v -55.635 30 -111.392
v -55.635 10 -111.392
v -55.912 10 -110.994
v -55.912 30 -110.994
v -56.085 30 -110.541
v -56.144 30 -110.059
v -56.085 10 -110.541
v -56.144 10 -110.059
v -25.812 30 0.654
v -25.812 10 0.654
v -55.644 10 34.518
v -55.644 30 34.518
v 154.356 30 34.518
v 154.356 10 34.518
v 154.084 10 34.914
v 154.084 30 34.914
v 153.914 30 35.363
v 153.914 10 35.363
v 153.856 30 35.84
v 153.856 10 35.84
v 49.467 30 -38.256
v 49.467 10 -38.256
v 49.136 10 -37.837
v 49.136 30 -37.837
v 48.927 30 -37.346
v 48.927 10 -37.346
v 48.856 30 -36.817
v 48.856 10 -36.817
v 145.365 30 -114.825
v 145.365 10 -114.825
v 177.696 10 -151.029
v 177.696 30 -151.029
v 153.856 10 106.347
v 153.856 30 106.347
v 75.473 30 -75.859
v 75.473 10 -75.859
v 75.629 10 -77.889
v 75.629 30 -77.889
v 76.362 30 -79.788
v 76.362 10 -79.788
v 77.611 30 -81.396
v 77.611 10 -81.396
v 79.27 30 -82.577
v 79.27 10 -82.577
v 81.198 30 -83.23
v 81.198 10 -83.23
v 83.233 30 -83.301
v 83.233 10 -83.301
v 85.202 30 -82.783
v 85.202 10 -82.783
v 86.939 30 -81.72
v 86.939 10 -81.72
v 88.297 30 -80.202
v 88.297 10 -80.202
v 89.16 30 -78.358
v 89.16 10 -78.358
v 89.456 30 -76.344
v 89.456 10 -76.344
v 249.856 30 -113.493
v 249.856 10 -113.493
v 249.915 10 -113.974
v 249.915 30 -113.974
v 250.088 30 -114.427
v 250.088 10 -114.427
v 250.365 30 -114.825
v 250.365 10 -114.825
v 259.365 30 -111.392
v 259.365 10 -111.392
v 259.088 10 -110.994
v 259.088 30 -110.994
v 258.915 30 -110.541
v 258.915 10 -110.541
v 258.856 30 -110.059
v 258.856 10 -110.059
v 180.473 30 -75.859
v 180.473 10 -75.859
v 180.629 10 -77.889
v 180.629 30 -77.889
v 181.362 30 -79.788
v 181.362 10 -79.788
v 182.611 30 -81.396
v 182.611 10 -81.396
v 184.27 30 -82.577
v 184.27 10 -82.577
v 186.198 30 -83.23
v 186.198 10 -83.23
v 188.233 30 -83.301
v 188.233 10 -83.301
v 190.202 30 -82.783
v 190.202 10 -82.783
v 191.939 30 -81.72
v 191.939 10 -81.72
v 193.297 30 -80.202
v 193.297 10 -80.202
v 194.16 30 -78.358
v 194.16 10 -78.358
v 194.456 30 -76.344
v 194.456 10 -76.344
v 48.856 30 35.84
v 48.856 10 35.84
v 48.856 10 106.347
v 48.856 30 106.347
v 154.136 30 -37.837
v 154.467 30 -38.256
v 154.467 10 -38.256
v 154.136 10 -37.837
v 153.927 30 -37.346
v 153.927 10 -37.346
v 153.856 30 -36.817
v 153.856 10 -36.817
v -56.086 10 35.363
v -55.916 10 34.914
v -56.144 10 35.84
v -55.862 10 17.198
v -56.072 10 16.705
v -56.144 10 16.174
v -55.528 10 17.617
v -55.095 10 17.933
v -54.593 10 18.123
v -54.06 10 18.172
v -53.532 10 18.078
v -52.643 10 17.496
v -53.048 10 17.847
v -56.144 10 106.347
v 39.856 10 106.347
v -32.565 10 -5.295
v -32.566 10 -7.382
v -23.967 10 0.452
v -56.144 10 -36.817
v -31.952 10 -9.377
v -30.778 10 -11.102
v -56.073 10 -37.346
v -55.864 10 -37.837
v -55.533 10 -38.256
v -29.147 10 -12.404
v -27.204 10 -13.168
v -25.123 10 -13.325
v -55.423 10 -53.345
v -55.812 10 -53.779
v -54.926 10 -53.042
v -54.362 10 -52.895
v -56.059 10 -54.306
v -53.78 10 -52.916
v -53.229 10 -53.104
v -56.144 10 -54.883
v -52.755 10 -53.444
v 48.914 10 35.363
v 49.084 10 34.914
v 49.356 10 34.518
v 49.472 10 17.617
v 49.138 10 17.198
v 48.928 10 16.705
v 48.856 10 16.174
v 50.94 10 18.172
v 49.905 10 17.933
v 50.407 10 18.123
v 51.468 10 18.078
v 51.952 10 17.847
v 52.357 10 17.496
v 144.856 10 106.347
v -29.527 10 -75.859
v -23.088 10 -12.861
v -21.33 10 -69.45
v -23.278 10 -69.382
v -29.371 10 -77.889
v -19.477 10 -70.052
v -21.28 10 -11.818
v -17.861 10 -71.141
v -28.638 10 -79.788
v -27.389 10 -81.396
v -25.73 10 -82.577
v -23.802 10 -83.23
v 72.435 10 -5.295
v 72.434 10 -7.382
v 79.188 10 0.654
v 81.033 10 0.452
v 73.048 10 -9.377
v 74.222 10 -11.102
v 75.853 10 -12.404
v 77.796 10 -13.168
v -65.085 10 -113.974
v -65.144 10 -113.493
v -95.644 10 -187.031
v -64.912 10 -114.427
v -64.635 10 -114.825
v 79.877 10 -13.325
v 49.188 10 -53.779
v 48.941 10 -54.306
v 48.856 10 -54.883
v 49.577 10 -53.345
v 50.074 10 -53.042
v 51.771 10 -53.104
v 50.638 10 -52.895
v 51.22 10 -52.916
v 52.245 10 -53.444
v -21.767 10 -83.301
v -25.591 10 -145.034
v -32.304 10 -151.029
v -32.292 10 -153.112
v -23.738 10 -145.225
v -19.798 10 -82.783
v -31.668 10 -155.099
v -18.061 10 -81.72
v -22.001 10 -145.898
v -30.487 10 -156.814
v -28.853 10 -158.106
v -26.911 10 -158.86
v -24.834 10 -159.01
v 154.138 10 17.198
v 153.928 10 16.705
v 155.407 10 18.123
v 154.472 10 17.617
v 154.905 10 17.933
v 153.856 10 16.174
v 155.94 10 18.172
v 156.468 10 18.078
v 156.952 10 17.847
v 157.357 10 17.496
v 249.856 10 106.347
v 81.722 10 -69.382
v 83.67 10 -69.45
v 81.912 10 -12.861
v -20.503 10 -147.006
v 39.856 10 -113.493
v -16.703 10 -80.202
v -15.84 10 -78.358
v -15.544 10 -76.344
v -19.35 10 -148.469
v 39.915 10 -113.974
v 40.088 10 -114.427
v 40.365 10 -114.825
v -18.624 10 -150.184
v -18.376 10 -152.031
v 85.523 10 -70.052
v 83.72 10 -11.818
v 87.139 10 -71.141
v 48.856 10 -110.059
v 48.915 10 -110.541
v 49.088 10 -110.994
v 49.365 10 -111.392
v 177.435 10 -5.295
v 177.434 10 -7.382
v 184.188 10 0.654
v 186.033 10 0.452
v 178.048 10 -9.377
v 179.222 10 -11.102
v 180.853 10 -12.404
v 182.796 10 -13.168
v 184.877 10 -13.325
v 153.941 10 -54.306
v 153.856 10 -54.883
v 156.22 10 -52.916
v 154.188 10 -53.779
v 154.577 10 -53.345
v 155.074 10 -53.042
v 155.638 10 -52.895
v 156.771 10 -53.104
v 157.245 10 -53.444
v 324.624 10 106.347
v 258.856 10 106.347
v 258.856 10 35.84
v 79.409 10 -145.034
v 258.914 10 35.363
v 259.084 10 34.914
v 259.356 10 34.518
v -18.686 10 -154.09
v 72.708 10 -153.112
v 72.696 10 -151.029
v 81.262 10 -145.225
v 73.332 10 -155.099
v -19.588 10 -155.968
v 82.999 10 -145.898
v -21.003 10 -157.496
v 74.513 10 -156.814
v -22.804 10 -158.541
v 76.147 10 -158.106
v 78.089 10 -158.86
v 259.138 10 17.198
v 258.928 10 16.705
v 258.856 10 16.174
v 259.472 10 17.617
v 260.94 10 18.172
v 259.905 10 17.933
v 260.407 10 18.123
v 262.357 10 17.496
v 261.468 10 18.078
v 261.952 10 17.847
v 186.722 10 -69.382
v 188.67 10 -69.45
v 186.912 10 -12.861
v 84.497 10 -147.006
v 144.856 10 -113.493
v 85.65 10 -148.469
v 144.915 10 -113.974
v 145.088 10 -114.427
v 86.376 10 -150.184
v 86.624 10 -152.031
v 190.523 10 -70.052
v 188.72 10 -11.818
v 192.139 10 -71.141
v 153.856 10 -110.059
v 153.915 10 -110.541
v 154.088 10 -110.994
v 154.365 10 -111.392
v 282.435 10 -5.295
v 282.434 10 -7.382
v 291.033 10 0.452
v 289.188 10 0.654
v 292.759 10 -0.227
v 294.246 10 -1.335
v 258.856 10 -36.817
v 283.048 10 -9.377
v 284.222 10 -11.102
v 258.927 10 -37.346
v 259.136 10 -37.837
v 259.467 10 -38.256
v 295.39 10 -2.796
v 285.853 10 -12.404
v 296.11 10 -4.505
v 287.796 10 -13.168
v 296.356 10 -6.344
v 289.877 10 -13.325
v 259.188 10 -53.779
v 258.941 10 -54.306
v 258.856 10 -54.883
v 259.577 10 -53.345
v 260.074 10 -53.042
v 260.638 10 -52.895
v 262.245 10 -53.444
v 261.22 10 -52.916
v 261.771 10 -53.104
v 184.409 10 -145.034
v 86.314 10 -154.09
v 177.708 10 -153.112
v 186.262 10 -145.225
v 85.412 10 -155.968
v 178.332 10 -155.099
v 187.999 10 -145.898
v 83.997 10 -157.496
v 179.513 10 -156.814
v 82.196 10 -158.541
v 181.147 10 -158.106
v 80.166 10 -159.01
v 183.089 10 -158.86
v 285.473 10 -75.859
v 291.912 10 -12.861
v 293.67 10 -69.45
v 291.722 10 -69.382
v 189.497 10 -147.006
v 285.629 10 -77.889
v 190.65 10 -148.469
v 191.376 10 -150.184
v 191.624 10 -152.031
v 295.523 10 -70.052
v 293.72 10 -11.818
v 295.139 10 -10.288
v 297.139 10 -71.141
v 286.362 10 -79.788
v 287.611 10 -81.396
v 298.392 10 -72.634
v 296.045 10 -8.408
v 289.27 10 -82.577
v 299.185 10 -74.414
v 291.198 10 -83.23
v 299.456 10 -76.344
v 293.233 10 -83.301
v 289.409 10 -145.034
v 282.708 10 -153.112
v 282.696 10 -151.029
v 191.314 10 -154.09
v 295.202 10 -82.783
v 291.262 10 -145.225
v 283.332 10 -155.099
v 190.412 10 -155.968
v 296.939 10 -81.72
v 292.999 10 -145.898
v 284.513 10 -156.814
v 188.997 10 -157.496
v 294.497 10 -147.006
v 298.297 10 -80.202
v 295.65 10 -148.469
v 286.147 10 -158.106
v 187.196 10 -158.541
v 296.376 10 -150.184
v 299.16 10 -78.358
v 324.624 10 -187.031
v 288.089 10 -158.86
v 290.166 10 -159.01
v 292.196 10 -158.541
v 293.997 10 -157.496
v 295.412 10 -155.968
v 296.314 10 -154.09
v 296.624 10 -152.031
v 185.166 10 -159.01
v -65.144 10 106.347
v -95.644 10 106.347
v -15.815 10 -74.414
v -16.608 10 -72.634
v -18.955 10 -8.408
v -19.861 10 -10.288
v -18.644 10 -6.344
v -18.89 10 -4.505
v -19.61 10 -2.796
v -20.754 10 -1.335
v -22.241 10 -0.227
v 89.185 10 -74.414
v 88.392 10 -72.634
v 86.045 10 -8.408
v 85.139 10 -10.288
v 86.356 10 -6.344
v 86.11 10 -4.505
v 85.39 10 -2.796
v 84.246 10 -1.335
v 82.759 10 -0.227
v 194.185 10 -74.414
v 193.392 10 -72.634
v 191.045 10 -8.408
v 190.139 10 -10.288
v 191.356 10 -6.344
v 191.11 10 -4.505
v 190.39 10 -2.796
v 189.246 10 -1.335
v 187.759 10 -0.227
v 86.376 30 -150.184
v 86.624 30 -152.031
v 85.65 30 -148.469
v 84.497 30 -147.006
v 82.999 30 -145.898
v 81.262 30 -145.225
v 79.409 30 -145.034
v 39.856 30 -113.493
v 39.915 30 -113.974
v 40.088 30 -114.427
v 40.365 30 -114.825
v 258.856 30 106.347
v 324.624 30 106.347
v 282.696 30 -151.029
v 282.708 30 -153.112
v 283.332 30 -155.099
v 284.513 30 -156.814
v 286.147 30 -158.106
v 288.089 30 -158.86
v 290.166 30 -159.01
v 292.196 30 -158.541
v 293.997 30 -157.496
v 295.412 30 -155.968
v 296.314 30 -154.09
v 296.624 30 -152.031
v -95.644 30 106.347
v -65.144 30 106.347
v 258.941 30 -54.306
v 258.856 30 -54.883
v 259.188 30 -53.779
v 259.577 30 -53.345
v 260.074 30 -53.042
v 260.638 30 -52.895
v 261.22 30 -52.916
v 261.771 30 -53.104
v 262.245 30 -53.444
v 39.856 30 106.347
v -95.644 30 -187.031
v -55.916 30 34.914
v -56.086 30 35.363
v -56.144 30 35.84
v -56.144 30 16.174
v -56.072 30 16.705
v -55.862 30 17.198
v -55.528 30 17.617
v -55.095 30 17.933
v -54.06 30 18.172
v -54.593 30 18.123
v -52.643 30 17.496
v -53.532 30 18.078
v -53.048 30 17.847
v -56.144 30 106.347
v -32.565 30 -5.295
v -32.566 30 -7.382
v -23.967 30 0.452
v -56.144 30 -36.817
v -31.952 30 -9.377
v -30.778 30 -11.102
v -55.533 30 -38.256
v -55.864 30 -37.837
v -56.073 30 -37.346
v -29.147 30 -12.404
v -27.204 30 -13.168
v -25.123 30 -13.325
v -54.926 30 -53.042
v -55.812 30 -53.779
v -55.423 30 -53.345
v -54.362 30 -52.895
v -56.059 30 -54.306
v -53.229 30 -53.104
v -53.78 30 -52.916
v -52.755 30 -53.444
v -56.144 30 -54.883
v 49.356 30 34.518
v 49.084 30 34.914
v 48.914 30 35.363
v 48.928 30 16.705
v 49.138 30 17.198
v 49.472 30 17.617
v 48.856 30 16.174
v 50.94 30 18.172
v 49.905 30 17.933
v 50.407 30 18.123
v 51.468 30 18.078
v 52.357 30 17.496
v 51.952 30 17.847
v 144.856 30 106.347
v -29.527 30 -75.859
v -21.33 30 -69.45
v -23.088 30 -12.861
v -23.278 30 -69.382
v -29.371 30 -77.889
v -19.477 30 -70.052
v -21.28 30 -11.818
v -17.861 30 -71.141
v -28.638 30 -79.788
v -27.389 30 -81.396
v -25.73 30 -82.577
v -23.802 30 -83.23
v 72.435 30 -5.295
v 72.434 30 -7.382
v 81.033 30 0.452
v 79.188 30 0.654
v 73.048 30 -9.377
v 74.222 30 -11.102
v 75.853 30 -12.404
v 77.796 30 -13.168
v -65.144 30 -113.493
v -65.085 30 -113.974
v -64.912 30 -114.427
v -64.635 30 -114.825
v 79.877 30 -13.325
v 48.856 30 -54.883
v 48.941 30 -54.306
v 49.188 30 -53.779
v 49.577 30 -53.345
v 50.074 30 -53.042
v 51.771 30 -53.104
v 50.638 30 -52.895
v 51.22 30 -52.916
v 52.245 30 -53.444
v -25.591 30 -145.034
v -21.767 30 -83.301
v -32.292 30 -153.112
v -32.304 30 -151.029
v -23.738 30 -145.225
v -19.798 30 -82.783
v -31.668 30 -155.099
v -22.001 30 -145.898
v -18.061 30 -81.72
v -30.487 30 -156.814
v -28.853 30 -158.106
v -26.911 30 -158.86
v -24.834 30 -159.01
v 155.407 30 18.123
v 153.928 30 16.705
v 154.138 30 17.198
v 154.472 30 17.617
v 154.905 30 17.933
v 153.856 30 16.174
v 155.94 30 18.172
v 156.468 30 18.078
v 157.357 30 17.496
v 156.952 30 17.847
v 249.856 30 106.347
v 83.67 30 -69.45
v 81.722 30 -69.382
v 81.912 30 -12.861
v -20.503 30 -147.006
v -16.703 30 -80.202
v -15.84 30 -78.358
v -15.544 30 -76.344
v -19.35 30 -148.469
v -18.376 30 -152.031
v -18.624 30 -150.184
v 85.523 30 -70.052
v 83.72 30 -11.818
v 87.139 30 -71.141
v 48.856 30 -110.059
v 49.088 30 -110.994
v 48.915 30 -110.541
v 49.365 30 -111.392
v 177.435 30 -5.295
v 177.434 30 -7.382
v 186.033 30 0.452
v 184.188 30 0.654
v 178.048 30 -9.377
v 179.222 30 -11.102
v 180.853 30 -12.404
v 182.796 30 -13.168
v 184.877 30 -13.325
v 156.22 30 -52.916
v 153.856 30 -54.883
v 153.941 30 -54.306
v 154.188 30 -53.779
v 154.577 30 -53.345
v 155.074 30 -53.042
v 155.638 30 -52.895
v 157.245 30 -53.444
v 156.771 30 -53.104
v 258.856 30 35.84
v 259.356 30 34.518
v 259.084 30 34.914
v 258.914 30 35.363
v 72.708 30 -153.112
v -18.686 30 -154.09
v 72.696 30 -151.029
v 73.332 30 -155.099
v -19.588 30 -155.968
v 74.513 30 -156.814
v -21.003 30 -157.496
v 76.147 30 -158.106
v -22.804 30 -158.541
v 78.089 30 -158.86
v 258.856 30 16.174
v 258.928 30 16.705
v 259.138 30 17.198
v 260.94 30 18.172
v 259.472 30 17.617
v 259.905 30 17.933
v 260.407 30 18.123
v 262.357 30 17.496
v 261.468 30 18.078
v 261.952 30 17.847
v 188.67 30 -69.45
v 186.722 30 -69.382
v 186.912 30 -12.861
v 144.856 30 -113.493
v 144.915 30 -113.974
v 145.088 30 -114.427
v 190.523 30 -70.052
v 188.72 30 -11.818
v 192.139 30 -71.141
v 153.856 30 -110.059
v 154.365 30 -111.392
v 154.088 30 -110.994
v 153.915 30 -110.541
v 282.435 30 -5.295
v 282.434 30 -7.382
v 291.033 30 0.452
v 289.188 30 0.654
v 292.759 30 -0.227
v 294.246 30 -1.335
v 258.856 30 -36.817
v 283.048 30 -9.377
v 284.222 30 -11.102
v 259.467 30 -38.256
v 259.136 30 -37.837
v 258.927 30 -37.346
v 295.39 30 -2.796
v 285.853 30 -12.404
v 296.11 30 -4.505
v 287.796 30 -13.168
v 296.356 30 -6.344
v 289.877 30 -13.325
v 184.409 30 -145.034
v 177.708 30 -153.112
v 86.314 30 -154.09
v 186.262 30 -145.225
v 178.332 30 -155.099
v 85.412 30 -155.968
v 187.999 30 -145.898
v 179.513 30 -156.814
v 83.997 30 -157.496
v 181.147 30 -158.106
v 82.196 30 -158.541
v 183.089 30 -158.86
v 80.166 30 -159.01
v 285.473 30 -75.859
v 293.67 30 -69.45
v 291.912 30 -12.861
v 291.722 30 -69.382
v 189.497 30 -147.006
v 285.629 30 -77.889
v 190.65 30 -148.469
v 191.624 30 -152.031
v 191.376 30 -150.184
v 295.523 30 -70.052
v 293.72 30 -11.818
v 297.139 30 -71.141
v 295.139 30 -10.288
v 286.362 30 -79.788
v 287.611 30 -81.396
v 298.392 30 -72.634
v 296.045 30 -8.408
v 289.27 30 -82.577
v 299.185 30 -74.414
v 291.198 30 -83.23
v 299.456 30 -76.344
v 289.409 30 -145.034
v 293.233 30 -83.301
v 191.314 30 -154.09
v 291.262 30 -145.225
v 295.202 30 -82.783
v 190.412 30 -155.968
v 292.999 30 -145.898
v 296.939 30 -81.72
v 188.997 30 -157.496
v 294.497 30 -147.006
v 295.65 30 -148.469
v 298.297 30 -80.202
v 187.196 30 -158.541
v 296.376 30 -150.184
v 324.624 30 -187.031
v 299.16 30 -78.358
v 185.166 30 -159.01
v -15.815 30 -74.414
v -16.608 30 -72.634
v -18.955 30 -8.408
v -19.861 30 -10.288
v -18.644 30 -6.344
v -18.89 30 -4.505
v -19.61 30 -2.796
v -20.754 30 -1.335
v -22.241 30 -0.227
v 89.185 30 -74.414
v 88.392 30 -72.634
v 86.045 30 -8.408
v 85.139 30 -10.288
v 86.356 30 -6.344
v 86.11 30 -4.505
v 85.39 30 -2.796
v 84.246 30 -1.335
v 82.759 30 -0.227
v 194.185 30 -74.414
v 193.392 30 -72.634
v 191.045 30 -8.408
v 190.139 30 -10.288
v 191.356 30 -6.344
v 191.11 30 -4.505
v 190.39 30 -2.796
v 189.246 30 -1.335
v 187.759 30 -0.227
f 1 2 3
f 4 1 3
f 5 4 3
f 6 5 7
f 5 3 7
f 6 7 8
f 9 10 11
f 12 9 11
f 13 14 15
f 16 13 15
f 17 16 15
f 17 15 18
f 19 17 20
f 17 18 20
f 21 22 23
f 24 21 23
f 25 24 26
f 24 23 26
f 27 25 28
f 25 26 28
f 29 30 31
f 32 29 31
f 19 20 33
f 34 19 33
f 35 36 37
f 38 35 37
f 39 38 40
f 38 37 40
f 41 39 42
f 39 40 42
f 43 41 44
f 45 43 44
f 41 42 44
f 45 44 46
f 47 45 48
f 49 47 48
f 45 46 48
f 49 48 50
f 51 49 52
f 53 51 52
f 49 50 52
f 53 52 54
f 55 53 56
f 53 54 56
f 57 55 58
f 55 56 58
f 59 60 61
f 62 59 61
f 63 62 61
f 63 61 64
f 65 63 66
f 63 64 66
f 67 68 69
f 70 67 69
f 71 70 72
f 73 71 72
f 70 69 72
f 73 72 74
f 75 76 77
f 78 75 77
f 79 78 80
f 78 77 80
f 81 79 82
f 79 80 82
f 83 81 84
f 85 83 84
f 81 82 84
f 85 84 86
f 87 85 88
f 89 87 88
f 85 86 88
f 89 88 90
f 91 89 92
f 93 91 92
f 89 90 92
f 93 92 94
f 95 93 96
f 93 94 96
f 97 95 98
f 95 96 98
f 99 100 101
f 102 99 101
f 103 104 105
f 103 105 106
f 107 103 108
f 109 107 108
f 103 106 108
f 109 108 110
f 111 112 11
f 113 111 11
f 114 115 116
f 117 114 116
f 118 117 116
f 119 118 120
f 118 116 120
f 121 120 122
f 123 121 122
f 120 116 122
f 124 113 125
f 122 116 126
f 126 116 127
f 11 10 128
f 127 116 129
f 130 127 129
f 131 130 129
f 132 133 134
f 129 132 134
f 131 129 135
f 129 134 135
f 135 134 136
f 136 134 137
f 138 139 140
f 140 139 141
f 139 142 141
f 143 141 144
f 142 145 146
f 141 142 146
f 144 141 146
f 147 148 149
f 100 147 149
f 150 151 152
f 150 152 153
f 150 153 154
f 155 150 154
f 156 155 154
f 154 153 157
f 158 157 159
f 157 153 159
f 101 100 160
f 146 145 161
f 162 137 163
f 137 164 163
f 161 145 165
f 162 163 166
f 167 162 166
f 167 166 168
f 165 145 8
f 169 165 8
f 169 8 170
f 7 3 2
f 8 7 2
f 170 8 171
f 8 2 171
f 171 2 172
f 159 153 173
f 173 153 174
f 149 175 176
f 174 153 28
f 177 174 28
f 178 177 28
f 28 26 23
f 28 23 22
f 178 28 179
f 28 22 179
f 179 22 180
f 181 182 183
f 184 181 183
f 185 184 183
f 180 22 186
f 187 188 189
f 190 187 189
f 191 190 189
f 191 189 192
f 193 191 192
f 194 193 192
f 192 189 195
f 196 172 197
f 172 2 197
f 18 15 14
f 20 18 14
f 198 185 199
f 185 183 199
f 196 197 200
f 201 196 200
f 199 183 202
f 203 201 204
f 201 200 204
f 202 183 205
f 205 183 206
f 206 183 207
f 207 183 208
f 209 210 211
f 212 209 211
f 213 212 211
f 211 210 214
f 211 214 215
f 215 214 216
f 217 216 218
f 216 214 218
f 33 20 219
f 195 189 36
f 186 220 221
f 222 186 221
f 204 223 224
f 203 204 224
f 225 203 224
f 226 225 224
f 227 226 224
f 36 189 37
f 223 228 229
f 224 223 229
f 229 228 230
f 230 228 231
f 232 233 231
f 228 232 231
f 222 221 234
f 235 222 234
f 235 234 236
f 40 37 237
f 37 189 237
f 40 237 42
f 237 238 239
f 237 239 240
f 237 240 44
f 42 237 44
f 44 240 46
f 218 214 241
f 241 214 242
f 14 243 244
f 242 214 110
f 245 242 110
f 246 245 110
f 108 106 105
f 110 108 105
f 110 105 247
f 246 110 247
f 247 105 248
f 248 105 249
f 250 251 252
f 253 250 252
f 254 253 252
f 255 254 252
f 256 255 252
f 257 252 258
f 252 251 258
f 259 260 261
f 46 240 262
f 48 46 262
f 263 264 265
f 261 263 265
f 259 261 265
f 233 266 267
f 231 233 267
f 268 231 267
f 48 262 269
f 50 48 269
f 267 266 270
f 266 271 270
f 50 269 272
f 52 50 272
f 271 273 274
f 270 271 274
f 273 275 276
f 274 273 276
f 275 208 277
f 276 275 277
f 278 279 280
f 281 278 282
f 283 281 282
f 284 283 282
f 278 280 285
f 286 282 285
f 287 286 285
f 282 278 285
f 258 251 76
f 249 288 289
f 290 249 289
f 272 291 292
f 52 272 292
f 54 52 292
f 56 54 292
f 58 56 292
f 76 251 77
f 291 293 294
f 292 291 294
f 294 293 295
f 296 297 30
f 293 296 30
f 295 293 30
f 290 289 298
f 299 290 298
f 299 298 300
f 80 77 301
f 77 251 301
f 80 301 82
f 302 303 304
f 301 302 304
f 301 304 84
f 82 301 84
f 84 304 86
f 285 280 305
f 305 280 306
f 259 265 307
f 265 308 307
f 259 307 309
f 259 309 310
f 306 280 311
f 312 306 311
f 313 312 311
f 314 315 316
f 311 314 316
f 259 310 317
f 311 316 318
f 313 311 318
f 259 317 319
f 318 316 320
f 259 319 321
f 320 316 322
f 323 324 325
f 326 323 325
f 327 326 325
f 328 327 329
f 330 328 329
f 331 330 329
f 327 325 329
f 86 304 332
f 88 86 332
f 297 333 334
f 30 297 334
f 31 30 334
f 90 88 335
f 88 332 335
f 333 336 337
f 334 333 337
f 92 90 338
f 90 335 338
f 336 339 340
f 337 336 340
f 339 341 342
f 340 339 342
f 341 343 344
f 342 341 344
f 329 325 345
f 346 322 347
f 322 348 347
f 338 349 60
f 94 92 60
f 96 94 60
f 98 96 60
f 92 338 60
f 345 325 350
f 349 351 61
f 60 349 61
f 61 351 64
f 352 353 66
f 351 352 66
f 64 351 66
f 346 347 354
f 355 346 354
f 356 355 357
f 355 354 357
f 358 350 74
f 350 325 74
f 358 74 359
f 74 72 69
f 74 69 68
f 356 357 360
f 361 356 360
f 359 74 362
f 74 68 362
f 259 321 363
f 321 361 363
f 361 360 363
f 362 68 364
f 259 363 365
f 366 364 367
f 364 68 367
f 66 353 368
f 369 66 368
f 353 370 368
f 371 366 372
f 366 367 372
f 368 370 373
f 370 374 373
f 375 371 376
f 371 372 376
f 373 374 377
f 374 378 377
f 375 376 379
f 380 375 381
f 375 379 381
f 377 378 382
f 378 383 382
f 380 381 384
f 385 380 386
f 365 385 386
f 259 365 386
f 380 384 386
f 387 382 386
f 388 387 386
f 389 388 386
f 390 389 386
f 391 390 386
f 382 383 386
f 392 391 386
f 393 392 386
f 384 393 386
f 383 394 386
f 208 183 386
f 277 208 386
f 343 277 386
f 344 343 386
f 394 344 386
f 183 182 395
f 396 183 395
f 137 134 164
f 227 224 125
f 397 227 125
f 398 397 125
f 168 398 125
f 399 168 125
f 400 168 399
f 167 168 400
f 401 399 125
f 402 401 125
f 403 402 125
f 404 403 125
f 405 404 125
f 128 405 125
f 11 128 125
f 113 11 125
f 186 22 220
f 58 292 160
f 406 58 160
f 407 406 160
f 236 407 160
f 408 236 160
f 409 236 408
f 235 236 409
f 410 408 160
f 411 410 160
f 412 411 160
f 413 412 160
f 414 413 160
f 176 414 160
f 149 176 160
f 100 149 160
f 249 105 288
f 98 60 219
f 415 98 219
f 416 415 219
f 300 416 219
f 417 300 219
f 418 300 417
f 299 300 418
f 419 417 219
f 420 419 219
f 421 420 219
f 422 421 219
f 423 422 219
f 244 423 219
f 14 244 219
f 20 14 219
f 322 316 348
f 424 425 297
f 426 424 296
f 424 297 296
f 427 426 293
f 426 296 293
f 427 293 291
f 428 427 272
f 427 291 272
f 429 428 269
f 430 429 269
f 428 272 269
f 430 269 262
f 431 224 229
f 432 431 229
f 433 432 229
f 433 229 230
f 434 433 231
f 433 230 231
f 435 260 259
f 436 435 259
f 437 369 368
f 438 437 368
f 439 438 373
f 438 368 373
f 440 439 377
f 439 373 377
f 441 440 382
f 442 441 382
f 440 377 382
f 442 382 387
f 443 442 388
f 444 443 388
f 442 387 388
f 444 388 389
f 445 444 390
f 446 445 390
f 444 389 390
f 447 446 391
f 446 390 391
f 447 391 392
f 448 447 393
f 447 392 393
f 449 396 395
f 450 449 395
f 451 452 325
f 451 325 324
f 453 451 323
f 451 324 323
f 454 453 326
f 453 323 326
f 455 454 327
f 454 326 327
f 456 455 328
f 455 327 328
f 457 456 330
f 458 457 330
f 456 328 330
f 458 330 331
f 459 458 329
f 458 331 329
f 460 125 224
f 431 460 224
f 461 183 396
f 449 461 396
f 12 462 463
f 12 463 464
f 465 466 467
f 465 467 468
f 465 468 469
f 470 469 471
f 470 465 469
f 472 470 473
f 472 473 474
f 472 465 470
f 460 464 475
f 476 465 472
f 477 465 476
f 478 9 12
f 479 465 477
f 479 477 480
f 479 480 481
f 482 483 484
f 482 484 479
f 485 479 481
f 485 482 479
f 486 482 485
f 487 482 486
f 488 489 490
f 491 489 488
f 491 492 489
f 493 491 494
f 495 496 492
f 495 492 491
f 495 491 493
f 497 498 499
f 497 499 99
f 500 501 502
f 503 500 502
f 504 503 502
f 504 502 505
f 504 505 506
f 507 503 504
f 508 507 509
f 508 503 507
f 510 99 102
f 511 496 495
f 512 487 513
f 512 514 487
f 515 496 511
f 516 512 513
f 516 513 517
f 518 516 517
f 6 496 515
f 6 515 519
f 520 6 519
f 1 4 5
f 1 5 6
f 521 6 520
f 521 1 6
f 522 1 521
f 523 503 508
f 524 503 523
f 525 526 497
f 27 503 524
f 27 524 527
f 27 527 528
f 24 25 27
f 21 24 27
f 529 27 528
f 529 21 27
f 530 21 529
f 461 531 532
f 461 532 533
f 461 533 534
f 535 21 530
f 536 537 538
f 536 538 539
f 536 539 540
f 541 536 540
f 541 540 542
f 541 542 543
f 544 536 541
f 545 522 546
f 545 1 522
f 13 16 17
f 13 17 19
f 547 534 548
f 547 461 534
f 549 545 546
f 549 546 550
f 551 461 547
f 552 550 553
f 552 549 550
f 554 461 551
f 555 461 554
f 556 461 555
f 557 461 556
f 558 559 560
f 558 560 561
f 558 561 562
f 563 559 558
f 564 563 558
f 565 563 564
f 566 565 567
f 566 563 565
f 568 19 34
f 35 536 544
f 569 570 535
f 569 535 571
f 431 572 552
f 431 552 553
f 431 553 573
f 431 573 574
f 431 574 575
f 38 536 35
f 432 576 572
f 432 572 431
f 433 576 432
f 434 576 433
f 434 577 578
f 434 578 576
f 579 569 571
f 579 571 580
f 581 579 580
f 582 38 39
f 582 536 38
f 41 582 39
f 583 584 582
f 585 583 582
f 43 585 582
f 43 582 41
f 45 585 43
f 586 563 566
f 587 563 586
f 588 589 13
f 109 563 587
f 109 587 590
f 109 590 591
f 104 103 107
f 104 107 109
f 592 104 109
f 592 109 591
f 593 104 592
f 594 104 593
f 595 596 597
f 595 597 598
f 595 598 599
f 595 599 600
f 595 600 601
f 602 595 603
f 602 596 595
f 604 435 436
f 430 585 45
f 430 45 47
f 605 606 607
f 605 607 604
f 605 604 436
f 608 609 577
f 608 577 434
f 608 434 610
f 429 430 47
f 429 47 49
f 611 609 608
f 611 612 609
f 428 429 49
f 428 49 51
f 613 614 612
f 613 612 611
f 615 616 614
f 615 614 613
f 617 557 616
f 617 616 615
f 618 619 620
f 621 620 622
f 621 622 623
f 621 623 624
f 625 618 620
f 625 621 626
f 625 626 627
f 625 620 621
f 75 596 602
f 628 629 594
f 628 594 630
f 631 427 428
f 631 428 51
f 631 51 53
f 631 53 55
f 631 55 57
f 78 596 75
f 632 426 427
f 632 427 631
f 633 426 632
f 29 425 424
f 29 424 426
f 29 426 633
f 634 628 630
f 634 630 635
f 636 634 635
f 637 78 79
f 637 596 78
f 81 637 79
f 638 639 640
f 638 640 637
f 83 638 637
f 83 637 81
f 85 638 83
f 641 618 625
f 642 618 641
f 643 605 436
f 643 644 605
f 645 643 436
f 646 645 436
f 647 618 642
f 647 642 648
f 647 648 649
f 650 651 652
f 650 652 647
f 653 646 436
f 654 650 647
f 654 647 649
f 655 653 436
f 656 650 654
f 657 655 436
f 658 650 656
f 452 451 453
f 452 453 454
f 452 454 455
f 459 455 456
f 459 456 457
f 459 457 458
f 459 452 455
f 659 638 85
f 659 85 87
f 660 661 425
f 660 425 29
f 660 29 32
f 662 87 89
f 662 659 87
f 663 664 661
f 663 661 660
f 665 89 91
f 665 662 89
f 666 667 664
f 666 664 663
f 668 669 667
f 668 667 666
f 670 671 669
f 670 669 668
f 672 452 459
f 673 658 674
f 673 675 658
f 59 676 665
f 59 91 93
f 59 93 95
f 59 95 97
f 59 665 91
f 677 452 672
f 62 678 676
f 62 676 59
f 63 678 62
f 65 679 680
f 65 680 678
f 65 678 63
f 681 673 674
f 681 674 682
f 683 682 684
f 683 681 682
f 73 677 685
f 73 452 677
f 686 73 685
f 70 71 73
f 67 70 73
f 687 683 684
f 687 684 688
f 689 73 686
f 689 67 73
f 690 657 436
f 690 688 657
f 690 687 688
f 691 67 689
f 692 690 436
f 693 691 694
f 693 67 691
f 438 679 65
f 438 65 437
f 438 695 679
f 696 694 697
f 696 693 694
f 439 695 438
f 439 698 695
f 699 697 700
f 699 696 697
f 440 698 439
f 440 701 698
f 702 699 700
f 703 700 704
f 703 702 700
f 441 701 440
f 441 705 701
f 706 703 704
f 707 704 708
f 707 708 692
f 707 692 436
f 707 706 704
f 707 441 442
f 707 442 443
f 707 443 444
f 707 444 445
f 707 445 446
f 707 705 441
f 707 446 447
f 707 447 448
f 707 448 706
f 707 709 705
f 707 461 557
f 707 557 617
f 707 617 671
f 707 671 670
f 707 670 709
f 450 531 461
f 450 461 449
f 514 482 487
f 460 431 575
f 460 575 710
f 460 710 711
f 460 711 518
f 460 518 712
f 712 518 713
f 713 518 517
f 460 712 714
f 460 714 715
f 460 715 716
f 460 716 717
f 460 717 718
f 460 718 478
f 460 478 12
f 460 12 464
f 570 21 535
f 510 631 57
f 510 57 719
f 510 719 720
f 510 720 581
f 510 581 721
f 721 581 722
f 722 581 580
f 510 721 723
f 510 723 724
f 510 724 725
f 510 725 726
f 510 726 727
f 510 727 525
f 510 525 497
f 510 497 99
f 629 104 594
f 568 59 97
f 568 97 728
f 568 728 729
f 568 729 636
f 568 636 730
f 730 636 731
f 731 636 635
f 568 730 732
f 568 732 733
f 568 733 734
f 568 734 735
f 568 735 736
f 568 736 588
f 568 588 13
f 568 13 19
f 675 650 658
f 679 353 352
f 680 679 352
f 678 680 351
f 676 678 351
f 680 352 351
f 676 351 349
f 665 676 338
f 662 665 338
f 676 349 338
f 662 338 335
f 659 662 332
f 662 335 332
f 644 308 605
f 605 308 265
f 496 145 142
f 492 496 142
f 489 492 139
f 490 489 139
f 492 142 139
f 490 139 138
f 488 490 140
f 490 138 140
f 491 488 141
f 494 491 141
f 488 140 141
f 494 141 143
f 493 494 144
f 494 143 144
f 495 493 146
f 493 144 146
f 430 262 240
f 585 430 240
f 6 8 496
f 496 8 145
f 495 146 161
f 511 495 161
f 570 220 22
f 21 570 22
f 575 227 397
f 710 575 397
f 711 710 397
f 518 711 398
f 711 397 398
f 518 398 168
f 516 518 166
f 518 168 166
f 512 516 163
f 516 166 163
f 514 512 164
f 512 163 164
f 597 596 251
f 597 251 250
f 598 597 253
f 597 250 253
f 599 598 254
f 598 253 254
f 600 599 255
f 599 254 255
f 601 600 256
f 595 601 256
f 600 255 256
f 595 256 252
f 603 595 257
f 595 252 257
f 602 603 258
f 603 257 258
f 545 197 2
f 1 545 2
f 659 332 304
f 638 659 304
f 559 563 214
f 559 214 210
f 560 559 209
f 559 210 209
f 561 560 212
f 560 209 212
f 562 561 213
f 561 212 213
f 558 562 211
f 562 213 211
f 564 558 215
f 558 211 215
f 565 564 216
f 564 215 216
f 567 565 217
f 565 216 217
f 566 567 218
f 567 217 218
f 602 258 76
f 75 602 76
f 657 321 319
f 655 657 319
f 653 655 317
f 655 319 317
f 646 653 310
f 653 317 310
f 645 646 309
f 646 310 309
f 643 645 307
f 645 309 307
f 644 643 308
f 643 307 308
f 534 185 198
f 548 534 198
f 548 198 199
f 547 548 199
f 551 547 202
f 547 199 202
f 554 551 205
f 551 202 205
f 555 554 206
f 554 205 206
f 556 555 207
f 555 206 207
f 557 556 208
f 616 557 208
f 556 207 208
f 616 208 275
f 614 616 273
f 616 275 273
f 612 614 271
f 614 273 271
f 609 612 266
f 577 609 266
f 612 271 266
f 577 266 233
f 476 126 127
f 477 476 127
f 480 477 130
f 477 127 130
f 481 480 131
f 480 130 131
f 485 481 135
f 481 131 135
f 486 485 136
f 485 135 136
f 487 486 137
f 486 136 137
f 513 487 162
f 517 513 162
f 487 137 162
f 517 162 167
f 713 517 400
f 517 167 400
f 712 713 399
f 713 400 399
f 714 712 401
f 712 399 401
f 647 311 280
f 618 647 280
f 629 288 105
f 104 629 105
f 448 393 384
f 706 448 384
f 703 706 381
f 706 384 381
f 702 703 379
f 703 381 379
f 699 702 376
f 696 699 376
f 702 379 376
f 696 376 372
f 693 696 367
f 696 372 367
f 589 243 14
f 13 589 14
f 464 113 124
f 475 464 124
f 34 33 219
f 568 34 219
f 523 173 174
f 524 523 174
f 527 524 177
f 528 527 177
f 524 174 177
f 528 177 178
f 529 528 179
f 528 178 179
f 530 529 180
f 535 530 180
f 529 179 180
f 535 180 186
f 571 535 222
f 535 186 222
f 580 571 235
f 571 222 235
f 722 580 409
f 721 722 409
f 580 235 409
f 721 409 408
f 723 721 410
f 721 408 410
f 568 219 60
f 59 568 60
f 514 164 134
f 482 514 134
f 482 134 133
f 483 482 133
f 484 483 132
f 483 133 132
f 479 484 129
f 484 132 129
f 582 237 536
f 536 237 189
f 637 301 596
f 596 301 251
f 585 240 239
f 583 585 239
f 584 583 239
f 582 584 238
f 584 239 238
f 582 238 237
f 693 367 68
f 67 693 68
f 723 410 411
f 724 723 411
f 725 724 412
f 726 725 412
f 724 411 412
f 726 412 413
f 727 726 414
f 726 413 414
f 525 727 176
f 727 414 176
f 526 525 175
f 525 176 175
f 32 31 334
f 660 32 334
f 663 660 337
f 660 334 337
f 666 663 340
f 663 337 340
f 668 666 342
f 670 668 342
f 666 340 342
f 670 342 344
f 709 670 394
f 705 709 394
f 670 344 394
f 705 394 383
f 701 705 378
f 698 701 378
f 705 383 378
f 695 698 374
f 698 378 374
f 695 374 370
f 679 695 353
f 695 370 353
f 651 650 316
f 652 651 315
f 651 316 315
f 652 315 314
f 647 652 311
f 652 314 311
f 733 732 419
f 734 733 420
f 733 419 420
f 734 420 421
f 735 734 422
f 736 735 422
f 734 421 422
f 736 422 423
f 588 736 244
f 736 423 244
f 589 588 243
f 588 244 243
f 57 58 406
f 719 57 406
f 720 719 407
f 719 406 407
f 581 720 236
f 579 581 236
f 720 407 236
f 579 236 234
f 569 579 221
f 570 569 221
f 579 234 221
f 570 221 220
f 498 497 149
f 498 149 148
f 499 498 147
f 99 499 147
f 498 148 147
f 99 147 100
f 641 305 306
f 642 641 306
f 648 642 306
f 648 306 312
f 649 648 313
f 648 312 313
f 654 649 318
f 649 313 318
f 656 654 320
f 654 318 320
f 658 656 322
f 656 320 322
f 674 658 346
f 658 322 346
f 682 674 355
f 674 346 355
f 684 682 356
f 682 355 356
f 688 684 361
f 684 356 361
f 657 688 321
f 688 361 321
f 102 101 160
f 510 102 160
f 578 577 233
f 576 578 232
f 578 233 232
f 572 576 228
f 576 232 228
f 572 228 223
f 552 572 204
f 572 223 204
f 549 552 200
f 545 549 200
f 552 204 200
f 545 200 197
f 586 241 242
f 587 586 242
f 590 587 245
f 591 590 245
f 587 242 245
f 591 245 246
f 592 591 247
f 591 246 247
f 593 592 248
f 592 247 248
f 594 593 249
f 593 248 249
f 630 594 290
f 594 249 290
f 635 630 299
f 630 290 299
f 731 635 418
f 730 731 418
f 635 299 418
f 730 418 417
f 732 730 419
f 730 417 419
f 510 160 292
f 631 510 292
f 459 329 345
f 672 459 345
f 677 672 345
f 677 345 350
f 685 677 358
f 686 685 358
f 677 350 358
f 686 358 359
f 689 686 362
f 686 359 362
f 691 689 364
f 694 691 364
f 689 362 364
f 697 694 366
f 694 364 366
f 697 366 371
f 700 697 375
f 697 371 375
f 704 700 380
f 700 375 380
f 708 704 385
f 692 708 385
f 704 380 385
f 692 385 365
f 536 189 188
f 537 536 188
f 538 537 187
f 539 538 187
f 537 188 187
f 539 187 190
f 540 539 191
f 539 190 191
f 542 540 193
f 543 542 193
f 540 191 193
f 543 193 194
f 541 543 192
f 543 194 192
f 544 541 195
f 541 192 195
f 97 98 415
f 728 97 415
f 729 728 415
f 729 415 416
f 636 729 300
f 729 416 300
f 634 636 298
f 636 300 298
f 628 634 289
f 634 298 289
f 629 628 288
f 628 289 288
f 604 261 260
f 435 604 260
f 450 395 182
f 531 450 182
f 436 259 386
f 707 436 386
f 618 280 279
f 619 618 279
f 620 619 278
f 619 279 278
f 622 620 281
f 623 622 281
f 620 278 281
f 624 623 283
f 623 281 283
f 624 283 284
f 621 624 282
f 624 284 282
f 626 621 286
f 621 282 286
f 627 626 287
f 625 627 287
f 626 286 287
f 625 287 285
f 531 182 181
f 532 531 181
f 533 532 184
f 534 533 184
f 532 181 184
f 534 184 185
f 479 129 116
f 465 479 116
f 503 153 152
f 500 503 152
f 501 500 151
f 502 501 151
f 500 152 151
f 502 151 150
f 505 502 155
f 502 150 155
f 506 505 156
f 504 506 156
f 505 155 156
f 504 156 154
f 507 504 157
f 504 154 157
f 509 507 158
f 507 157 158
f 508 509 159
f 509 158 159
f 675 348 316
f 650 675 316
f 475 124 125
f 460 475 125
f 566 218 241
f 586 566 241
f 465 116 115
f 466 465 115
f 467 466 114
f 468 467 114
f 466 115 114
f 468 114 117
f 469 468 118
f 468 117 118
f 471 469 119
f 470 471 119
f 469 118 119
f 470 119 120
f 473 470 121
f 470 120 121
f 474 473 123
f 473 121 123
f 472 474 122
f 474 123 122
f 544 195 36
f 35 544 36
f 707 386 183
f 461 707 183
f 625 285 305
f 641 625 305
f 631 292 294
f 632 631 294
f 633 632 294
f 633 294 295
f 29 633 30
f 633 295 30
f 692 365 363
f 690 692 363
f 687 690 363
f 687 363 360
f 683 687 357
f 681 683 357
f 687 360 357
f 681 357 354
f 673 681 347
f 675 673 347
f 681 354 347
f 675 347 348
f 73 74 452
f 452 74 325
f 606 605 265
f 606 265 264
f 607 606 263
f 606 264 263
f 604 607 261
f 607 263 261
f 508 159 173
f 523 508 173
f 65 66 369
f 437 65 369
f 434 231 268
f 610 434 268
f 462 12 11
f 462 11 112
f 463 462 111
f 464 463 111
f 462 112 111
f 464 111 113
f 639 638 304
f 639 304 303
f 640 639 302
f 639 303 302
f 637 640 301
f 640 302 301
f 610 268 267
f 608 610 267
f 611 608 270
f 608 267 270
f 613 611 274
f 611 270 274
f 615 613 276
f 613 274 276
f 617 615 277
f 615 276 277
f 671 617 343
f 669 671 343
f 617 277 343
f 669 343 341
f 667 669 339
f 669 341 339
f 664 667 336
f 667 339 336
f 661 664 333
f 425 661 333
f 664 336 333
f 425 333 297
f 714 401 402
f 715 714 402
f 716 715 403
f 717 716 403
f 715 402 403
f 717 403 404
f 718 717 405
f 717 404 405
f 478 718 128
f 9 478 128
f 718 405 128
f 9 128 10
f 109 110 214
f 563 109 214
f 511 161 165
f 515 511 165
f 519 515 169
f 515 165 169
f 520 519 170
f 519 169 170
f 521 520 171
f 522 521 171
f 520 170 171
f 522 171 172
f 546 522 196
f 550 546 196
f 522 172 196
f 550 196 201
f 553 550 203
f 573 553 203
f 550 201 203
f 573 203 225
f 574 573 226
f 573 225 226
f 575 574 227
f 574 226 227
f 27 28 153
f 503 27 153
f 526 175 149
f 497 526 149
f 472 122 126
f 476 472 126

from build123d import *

# Parameters (mm, degrees)
BOSS_EXTRUDE1_DEPTH = 20


with BuildPart() as part:
    # Sketch1 → Boss-Extrude1 (new body)
    with BuildSketch(Plane(origin=(0, 10, 0), x_dir=(1, 0, 0), z_dir=(0, 1, 0))):
        with BuildLine():
            Line((324.62395369, 187.030739377), (-95.643756342, 187.030739377))
            Line((-95.643756342, 187.030739377), (-95.643756342, -106.347051638))
            Line((-95.643756342, -106.347051638), (-65.143756342, -106.347051638))
            Line((-65.143756342, -106.347051638), (-65.143756342, -33.38491726))
            Line((-65.143756342, -33.38491726), (-65.143756342, 39.577217118))
            Line((-65.143756342, 39.577217118), (-65.143756342, 113.493168526))
            ThreePointArc((-65.143756342, 113.493168526), (-65.012374488, 114.20609645), (-64.635490117, 114.825358582))
            Line((-64.635490117, 114.825358582), (-32.303983997, 151.028901364))
            ThreePointArc((-32.303983997, 151.028901364), (-25.878259507, 159.012700556), (-18.37604631, 152.030739377))
            ThreePointArc((-18.37604631, 152.030739377), (-20.50295437, 147.005505557), (-25.591182009, 145.034046113))
            Line((-25.591182009, 145.034046113), (-55.635490117, 111.391617273))
            ThreePointArc((-55.635490117, 111.391617273), (-56.012374488, 110.772355142), (-56.143756342, 110.059427218))
            Line((-56.143756342, 110.059427218), (-56.143756342, 54.882804578))
            ThreePointArc((-56.143756342, 54.882804578), (-54.925540994, 53.041931753), (-52.754943584, 53.443638458))
            Line((-52.754943584, 53.443638458), (-29.527180359, 75.858711639))
            ThreePointArc((-29.527180359, 75.858711639), (-22.786771169, 83.339716759), (-15.544017337, 76.34392727))
            ThreePointArc((-15.544017337, 76.34392727), (-17.860778034, 71.141305851), (-23.277522947, 69.382464097))
            Line((-23.277522947, 69.382464097), (-55.5325691, 38.255953421))
            ThreePointArc((-55.5325691, 38.255953421), (-55.984629167, 37.598571952), (-56.143756342, 36.816787301))
            Line((-56.143756342, 36.816787301), (-56.143756342, -16.173695516))
            ThreePointArc((-56.143756342, -16.173695516), (-54.850365584, -18.044712186), (-52.643052963, -17.495773188))
            Line((-52.643052963, -17.495773188), (-32.564764827, 5.295289321))
            ThreePointArc((-32.564764827, 5.295289321), (-26.169560776, 13.324151457), (-18.643756342, 6.34392727))
            ThreePointArc((-18.643756342, 6.34392727), (-20.753710482, 1.335189757), (-25.811599623, -0.6540602))
            Line((-25.811599623, -0.6540602), (-55.644459721, -34.517633364))
            ThreePointArc((-55.644459721, -34.517633364), (-56.014773012, -35.133101793), (-56.143756342, -35.839711035))
            Line((-56.143756342, -35.839711035), (-56.143756342, -106.347051638))
            Line((-56.143756342, -106.347051638), (39.856243658, -106.347051638))
            Line((39.856243658, -106.347051638), (39.856243658, -33.38491726))
            Line((39.856243658, -33.38491726), (39.856243658, 39.577217118))
            Line((39.856243658, 39.577217118), (39.856243658, 113.493168526))
            ThreePointArc((39.856243658, 113.493168526), (39.987625512, 114.20609645), (40.364509883, 114.825358582))
            Line((40.364509883, 114.825358582), (72.696016003, 151.028901364))
            ThreePointArc((72.696016003, 151.028901364), (79.121740493, 159.012700556), (86.62395369, 152.030739377))
            ThreePointArc((86.62395369, 152.030739377), (84.49704563, 147.005505557), (79.408817991, 145.034046113))
            Line((79.408817991, 145.034046113), (49.364509883, 111.391617273))
            ThreePointArc((49.364509883, 111.391617273), (48.987625512, 110.772355142), (48.856243658, 110.059427218))
            Line((48.856243658, 110.059427218), (48.856243658, 54.882804578))
            ThreePointArc((48.856243658, 54.882804578), (50.074459006, 53.041931753), (52.245056416, 53.443638458))
            Line((52.245056416, 53.443638458), (75.472819641, 75.858711639))
            ThreePointArc((75.472819641, 75.858711639), (82.213228831, 83.339716759), (89.455982663, 76.34392727))
            ThreePointArc((89.455982663, 76.34392727), (87.139221966, 71.141305851), (81.722477053, 69.382464097))
            Line((81.722477053, 69.382464097), (49.4674309, 38.255953421))
            ThreePointArc((49.4674309, 38.255953421), (49.015370833, 37.598571952), (48.856243658, 36.816787301))
            Line((48.856243658, 36.816787301), (48.856243658, -16.173695516))
            ThreePointArc((48.856243658, -16.173695516), (50.149634416, -18.044712186), (52.356947037, -17.495773188))
            Line((52.356947037, -17.495773188), (72.435235173, 5.295289321))
            ThreePointArc((72.435235173, 5.295289321), (78.830439224, 13.324151457), (86.356243658, 6.34392727))
            ThreePointArc((86.356243658, 6.34392727), (84.246289518, 1.335189757), (79.188400377, -0.6540602))
            Line((79.188400377, -0.6540602), (49.355540279, -34.517633364))
            ThreePointArc((49.355540279, -34.517633364), (48.985226988, -35.133101793), (48.856243658, -35.839711035))
            Line((48.856243658, -35.839711035), (48.856243658, -106.347051638))
            Line((48.856243658, -106.347051638), (144.856243658, -106.347051638))
            Line((144.856243658, -106.347051638), (144.856243658, -33.38491726))
            Line((144.856243658, -33.38491726), (144.856243658, 39.577217118))
            Line((144.856243658, 39.577217118), (144.856243658, 113.493168526))
            ThreePointArc((144.856243658, 113.493168526), (144.987625512, 114.20609645), (145.364509883, 114.825358582))
            Line((145.364509883, 114.825358582), (177.696016003, 151.028901364))
            ThreePointArc((177.696016003, 151.028901364), (184.121740493, 159.012700556), (191.62395369, 152.030739377))
            ThreePointArc((191.62395369, 152.030739377), (189.49704563, 147.005505557), (184.408817991, 145.034046113))
            Line((184.408817991, 145.034046113), (154.364509883, 111.391617273))
            ThreePointArc((154.364509883, 111.391617273), (153.987625512, 110.772355142), (153.856243658, 110.059427218))
            Line((153.856243658, 110.059427218), (153.856243658, 54.882804578))
            ThreePointArc((153.856243658, 54.882804578), (155.074459006, 53.041931753), (157.245056416, 53.443638458))
            Line((157.245056416, 53.443638458), (180.472819641, 75.858711639))
            ThreePointArc((180.472819641, 75.858711639), (187.213228831, 83.339716759), (194.455982663, 76.34392727))
            ThreePointArc((194.455982663, 76.34392727), (192.139221966, 71.141305851), (186.722477053, 69.382464097))
            Line((186.722477053, 69.382464097), (154.4674309, 38.255953421))
            ThreePointArc((154.4674309, 38.255953421), (154.015370833, 37.598571952), (153.856243658, 36.816787301))
            Line((153.856243658, 36.816787301), (153.856243658, -16.173695516))
            ThreePointArc((153.856243658, -16.173695516), (155.149634416, -18.044712186), (157.356947037, -17.495773188))
            Line((157.356947037, -17.495773188), (177.435235173, 5.295289321))
            ThreePointArc((177.435235173, 5.295289321), (183.830439224, 13.324151457), (191.356243658, 6.34392727))
            ThreePointArc((191.356243658, 6.34392727), (189.246289518, 1.335189757), (184.188400377, -0.6540602))
            Line((184.188400377, -0.6540602), (154.355540279, -34.517633364))
            ThreePointArc((154.355540279, -34.517633364), (153.985226988, -35.133101793), (153.856243658, -35.839711035))
            Line((153.856243658, -35.839711035), (153.856243658, -106.347051638))
            Line((153.856243658, -106.347051638), (249.856243658, -106.347051638))
            Line((249.856243658, -106.347051638), (249.856243658, -33.38491726))
            Line((249.856243658, -33.38491726), (249.856243658, 39.577217118))
            Line((249.856243658, 39.577217118), (249.856243658, 113.493168526))
            ThreePointArc((249.856243658, 113.493168526), (249.987625512, 114.20609645), (250.364509883, 114.825358582))
            Line((250.364509883, 114.825358582), (282.696016003, 151.028901364))
            ThreePointArc((282.696016003, 151.028901364), (289.121740493, 159.012700556), (296.62395369, 152.030739377))
            ThreePointArc((296.62395369, 152.030739377), (294.49704563, 147.005505557), (289.408817991, 145.034046113))
            Line((289.408817991, 145.034046113), (259.364509883, 111.391617273))
            ThreePointArc((259.364509883, 111.391617273), (258.987625512, 110.772355142), (258.856243658, 110.059427218))
            Line((258.856243658, 110.059427218), (258.856243658, 54.882804578))
            ThreePointArc((258.856243658, 54.882804578), (260.074459006, 53.041931753), (262.245056416, 53.443638458))
            Line((262.245056416, 53.443638458), (285.472819641, 75.858711639))
            ThreePointArc((285.472819641, 75.858711639), (292.213228831, 83.339716759), (299.455982663, 76.34392727))
            ThreePointArc((299.455982663, 76.34392727), (297.139221966, 71.141305851), (291.722477053, 69.382464097))
            Line((291.722477053, 69.382464097), (259.4674309, 38.255953421))
            ThreePointArc((259.4674309, 38.255953421), (259.015370833, 37.598571952), (258.856243658, 36.816787301))
            Line((258.856243658, 36.816787301), (258.856243658, -16.173695516))
            ThreePointArc((258.856243658, -16.173695516), (260.149634416, -18.044712186), (262.356947037, -17.495773188))
            Line((262.356947037, -17.495773188), (282.435235173, 5.295289321))
            ThreePointArc((282.435235173, 5.295289321), (288.830439224, 13.324151457), (296.356243658, 6.34392727))
            ThreePointArc((296.356243658, 6.34392727), (294.246289518, 1.335189757), (289.188400377, -0.6540602))
            Line((289.188400377, -0.6540602), (259.355540279, -34.517633364))
            ThreePointArc((259.355540279, -34.517633364), (258.985226988, -35.133101793), (258.856243658, -35.839711035))
            Line((258.856243658, -35.839711035), (258.856243658, -106.347051638))
            Line((258.856243658, -106.347051638), (324.62395369, -106.347051638))
            Line((324.62395369, -106.347051638), (324.62395369, 187.030739377))
        make_face()
    extrude(amount=BOSS_EXTRUDE1_DEPTH)


solid = part.part
